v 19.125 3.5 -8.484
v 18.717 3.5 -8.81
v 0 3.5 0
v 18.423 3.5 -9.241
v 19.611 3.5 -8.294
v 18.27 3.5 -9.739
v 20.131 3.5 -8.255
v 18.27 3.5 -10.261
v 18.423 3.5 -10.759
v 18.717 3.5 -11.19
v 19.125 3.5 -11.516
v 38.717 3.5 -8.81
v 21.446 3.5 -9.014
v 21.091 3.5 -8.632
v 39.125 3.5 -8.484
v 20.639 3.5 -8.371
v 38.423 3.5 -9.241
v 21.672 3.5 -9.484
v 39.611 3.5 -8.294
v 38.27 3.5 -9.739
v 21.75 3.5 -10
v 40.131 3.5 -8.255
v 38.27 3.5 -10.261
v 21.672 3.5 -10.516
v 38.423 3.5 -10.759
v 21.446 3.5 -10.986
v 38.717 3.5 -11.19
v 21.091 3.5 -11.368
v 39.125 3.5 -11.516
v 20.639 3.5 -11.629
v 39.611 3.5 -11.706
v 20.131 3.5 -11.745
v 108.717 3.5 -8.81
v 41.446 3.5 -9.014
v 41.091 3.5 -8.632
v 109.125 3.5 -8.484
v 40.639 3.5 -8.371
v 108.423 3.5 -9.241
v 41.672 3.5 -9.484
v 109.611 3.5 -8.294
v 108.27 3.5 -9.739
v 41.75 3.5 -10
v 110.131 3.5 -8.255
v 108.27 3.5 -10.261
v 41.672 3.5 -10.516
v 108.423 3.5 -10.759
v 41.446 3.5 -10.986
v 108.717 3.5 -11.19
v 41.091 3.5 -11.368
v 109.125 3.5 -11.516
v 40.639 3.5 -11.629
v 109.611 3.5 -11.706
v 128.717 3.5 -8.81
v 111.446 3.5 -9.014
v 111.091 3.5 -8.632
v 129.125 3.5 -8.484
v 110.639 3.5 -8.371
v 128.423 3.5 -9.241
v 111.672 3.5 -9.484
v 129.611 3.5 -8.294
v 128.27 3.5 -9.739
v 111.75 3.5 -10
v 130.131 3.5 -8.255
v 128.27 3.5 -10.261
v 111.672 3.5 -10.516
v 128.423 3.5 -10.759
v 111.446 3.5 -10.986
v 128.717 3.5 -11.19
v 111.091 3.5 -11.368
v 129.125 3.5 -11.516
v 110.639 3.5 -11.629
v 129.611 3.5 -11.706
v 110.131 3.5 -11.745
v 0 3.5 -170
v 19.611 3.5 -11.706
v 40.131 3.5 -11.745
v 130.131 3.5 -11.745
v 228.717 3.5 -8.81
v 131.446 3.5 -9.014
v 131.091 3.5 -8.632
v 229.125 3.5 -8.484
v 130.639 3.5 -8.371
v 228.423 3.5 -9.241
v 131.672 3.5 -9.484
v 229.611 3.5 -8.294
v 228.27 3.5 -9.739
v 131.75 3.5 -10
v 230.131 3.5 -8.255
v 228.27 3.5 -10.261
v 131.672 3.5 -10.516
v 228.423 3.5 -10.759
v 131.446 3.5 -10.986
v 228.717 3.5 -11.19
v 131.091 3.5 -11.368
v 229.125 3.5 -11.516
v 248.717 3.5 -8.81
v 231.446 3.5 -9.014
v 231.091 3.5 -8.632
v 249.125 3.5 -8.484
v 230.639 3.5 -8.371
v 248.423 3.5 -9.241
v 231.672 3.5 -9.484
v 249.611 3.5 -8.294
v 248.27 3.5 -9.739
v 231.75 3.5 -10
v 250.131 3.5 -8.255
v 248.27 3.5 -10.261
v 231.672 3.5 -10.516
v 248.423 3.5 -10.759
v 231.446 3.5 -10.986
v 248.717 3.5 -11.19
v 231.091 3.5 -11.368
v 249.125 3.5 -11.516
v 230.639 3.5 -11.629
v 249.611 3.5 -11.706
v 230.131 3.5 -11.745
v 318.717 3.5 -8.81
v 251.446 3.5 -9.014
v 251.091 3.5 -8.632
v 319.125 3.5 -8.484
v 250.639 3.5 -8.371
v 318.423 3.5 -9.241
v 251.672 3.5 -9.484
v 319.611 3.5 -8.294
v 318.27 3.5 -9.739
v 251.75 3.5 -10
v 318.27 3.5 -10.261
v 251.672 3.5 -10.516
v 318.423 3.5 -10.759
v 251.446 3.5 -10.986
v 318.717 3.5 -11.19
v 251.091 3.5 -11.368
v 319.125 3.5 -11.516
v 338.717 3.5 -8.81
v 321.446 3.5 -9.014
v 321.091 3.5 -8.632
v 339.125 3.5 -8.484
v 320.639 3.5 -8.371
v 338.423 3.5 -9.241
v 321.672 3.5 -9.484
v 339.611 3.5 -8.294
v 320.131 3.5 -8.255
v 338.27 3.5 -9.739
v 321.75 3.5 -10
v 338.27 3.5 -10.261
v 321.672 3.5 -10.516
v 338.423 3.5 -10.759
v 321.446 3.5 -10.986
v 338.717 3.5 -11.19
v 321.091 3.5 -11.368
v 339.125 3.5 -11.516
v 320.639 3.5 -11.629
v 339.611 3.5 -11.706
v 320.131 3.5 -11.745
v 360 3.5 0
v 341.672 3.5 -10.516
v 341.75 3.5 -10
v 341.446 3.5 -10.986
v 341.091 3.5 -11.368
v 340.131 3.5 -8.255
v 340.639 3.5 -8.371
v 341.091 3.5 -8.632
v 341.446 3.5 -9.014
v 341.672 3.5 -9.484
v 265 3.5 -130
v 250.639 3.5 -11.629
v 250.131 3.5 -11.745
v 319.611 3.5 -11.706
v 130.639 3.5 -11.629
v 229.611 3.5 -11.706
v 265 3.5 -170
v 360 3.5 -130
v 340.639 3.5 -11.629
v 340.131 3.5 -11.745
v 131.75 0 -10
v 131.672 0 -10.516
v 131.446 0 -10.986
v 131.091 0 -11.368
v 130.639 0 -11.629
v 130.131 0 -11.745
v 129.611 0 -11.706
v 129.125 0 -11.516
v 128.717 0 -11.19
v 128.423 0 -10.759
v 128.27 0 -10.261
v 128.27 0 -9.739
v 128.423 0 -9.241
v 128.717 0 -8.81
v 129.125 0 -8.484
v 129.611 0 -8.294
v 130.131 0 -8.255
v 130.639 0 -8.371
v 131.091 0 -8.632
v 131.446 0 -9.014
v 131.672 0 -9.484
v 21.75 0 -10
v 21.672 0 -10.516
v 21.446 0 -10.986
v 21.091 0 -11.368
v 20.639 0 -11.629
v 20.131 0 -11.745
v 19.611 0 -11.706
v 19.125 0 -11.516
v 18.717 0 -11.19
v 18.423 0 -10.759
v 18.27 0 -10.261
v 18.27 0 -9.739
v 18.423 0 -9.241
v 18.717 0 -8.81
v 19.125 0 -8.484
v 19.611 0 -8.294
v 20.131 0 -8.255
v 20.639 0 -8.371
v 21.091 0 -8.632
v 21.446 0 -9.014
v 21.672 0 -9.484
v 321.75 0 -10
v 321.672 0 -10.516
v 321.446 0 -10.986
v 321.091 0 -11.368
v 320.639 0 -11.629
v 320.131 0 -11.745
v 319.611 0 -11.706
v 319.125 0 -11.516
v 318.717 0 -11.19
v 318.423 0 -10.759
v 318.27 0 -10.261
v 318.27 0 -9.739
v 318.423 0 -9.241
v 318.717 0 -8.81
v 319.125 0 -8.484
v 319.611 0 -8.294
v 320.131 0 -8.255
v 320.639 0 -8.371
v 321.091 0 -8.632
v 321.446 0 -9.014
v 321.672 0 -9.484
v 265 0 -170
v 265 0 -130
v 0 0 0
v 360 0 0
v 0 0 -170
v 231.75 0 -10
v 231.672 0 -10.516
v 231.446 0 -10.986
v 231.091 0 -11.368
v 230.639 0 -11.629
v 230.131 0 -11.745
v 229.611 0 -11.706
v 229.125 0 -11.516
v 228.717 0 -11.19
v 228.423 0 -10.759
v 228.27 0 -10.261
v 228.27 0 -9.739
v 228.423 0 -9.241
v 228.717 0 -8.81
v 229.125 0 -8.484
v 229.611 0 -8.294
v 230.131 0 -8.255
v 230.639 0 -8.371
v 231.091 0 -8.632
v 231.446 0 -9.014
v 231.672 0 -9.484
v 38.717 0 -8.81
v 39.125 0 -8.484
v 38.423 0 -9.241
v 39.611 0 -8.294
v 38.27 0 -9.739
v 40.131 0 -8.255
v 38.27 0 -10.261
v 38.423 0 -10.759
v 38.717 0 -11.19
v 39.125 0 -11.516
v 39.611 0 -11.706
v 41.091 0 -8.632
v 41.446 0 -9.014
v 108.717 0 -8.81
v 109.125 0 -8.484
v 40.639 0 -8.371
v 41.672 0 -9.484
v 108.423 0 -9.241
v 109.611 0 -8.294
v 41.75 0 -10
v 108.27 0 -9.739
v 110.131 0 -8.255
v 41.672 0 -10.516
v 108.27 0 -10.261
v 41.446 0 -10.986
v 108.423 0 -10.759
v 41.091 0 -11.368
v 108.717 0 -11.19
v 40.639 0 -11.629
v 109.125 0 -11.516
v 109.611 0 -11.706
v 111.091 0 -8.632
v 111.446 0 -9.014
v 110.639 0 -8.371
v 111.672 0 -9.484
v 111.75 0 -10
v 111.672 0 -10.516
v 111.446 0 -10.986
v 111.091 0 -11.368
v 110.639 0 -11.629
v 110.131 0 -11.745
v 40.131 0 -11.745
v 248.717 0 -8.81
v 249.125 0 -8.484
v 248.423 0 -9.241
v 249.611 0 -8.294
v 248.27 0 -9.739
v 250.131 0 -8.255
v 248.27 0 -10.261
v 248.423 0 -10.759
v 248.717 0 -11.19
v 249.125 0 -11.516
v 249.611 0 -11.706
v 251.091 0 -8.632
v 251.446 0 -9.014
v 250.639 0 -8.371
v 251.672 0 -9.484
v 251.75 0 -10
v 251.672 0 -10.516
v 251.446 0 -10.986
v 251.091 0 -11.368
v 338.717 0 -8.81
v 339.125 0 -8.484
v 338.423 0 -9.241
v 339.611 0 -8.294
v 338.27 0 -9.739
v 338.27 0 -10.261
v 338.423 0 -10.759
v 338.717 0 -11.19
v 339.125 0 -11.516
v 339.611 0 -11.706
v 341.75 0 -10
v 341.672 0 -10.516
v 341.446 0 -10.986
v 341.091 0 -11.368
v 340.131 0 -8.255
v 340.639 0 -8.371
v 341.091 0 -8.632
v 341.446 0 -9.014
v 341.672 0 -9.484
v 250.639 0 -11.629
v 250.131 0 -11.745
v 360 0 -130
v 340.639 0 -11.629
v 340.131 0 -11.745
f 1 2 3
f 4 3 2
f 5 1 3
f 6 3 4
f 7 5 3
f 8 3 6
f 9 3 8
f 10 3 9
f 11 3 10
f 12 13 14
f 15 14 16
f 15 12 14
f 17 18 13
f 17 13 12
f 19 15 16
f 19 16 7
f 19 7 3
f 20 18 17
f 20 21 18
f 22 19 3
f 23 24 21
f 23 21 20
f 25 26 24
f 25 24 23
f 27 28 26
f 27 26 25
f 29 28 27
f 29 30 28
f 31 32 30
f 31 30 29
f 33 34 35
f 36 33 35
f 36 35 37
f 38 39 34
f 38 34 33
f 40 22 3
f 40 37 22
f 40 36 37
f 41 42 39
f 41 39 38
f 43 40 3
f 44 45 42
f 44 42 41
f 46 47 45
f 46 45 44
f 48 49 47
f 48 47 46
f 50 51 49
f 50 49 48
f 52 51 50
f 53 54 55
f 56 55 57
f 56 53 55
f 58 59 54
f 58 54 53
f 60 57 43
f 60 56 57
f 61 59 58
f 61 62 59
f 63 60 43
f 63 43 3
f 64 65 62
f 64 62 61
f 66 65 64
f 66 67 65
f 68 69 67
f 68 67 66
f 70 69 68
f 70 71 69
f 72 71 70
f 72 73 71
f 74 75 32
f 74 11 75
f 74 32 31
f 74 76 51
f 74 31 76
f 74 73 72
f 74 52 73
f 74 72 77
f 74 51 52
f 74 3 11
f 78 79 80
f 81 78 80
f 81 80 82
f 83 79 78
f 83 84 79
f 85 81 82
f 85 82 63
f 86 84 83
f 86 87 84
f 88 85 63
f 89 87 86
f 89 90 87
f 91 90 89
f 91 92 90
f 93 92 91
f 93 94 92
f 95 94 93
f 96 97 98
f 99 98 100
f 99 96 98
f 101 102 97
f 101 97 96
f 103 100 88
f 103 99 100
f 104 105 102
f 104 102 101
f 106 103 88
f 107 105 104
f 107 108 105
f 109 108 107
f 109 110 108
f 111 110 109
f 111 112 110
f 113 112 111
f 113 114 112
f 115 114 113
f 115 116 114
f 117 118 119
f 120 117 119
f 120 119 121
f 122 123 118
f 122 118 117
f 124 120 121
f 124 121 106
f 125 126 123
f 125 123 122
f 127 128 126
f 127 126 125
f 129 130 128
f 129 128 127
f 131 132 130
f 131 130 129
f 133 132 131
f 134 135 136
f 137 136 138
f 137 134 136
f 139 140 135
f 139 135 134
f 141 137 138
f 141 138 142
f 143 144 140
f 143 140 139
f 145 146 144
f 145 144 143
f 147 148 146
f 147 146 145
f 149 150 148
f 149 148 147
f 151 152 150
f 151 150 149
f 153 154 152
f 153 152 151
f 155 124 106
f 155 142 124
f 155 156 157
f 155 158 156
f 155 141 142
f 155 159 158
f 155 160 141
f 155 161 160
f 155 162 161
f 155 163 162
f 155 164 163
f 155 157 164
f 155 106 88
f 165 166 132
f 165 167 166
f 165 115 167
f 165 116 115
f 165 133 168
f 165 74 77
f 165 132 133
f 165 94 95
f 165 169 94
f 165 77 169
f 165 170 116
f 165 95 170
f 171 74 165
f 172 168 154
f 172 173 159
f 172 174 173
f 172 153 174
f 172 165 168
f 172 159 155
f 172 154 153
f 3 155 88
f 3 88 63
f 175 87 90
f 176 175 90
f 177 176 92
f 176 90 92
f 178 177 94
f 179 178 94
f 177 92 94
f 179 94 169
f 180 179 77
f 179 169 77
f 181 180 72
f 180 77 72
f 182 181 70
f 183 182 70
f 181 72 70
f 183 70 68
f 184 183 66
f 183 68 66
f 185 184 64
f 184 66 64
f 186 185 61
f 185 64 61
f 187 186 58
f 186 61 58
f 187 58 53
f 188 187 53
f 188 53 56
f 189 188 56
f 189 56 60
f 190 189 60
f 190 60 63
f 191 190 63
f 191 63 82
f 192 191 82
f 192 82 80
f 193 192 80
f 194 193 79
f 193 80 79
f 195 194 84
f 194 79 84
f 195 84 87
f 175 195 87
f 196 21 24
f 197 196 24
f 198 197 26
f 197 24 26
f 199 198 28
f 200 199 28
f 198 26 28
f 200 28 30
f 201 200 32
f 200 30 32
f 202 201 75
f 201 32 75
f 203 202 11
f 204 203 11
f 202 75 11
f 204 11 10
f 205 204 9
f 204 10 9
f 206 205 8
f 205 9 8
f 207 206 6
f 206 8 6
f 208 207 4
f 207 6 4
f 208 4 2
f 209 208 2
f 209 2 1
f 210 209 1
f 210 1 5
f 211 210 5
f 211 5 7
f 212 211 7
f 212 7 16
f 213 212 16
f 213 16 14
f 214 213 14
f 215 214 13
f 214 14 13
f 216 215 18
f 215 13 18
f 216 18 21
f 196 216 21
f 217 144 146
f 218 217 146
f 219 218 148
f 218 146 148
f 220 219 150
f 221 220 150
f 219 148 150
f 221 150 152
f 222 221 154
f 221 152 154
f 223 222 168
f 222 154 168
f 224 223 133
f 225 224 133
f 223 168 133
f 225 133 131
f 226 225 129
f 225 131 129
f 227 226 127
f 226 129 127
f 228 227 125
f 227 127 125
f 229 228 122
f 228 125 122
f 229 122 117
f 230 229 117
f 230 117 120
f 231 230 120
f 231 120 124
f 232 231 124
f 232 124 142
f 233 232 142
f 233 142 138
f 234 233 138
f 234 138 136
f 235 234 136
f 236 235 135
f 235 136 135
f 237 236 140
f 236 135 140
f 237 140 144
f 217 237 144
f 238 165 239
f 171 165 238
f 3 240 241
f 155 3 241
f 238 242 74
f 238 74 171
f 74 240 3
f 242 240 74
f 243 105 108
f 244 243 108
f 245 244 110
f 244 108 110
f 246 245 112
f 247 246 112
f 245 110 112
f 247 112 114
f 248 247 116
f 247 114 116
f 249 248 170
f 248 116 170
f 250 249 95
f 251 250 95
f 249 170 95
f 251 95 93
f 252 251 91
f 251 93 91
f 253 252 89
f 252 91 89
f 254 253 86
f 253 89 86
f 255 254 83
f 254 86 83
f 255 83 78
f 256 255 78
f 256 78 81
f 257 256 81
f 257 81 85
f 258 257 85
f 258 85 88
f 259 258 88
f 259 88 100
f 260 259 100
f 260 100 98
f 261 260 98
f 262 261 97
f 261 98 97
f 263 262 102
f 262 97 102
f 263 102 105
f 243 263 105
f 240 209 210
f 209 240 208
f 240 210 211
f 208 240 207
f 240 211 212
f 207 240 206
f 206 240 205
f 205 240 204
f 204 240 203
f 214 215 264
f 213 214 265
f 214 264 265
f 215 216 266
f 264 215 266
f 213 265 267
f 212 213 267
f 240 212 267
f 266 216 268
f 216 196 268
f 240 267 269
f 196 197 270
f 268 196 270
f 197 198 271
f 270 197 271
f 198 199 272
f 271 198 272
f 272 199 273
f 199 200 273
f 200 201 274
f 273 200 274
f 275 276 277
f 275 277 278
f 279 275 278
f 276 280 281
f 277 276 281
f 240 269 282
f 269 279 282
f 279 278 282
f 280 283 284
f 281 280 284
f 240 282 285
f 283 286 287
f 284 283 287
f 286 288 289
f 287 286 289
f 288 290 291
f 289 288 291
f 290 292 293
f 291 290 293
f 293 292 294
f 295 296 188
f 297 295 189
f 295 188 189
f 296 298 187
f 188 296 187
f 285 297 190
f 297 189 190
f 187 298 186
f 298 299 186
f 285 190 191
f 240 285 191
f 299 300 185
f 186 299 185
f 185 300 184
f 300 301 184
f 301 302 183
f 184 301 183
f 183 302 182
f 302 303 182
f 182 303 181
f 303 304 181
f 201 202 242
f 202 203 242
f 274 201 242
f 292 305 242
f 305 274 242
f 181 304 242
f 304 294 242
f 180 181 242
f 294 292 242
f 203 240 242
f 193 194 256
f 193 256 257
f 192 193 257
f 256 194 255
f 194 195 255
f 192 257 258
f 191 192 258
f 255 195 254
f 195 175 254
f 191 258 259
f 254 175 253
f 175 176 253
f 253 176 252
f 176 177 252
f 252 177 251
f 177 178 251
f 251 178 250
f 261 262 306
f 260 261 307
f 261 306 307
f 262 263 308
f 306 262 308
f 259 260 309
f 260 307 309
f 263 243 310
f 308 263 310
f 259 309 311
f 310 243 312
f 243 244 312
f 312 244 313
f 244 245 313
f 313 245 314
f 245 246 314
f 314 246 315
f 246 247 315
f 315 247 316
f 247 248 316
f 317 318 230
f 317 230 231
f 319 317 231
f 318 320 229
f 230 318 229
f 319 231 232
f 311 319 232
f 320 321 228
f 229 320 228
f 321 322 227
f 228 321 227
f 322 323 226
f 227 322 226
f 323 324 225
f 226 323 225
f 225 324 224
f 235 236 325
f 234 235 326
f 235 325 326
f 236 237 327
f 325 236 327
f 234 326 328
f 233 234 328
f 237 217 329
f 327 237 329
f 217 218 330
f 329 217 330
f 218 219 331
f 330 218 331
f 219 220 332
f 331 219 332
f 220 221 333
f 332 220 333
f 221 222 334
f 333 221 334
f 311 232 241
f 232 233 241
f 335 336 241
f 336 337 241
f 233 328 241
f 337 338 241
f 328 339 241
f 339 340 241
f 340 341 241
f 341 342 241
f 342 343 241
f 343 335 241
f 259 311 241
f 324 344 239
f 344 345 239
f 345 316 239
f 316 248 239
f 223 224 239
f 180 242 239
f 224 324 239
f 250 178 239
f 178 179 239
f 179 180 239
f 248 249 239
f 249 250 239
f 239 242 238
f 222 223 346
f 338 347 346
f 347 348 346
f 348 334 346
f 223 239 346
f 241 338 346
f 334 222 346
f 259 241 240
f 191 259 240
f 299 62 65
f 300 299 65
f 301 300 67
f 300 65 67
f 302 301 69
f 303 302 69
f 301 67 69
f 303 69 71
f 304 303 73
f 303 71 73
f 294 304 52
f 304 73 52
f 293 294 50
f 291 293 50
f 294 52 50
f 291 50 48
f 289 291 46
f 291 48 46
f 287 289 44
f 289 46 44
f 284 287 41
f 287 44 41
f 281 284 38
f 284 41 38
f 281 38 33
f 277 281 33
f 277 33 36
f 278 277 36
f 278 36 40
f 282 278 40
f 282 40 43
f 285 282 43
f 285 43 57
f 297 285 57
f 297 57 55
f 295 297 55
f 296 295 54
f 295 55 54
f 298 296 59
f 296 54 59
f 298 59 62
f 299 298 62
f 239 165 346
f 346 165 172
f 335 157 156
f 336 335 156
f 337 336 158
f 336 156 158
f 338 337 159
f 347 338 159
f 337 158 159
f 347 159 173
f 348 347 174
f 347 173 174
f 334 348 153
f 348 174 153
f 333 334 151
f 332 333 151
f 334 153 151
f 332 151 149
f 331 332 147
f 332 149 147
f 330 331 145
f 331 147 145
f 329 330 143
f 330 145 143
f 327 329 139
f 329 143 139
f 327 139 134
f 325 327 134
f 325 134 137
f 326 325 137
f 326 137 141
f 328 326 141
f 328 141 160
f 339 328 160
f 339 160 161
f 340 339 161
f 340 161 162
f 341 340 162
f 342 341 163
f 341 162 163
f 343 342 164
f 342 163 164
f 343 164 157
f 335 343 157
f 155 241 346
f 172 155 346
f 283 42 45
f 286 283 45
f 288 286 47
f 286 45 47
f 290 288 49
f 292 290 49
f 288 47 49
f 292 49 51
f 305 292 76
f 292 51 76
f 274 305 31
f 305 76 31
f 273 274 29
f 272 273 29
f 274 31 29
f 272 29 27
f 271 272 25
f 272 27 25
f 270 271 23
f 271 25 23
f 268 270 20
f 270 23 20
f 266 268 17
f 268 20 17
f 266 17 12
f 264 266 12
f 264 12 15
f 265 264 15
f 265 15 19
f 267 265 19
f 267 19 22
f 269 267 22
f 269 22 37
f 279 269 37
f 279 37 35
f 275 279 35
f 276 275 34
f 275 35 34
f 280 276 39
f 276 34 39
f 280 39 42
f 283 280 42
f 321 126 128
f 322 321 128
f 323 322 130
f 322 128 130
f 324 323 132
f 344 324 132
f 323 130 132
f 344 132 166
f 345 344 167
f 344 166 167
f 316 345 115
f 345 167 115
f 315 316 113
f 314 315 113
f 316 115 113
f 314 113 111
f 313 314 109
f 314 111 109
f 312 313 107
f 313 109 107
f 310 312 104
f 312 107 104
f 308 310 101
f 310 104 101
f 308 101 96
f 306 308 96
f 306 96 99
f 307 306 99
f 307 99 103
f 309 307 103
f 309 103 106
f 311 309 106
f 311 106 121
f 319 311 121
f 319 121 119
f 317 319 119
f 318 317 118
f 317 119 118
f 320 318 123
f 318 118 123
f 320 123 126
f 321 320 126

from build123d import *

# Parameters (mm, degrees)
SKETCH1_W           = 360
SKETCH1_H           = 170
BOSS_EXTRUDE1_DEPTH = 3.5
SKETCH2_R           = 1.75
CUT_EXTRUDE1_DEPTH  = 3.5
CUT_EXTRUDE2_REACH  = 5.5
SKETCH3_W           = 95
SKETCH3_H           = 40


with BuildPart() as part:
    # Sketch1 → Boss-Extrude1 (new body)
    with BuildSketch(Plane(origin=(0, 0, 0), x_dir=(1, 0, 0), z_dir=(0, 1, 0))):
        with Locations((180, 85)):
            Rectangle(SKETCH1_W, SKETCH1_H)
    extrude(amount=BOSS_EXTRUDE1_DEPTH)

    # Sketch2 → Cut-Extrude1 (cut)
    with BuildSketch(Plane(origin=(0, 3.5, 0), x_dir=(1, 0, 0), z_dir=(0, 1, 0))):
        with Locations((20, 10)):
            Circle(SKETCH2_R)
        with Locations((40, 10)):
            Circle(SKETCH2_R)
        with Locations((110, 10)):
            Circle(SKETCH2_R)
        with Locations((130, 10)):
            Circle(SKETCH2_R)
        with Locations((230, 10)):
            Circle(SKETCH2_R)
        with Locations((250, 10)):
            Circle(SKETCH2_R)
        with Locations((320, 10)):
            Circle(SKETCH2_R)
        with Locations((340, 10)):
            Circle(SKETCH2_R)
    extrude(amount=-CUT_EXTRUDE1_DEPTH, mode=Mode.SUBTRACT)

    # Sketch3 → Cut-Extrude2 (cut, up to next)
    with BuildSketch(Plane(origin=(0, 3.5, 0), x_dir=(1, 0, 0), z_dir=(0, 1, 0)), mode=Mode.PRIVATE) as cut_extrude2_sk1:
        with Locations((312.5, 150)):
            Rectangle(SKETCH3_W, SKETCH3_H)
    cut_extrude2_tool1 = extrude(cut_extrude2_sk1.sketch, amount=-CUT_EXTRUDE2_REACH, mode=Mode.PRIVATE) & part.part
    add(cut_extrude2_tool1.solids().sort_by_distance((312.5, 3.5, -150))[0], mode=Mode.SUBTRACT)


solid = part.part
